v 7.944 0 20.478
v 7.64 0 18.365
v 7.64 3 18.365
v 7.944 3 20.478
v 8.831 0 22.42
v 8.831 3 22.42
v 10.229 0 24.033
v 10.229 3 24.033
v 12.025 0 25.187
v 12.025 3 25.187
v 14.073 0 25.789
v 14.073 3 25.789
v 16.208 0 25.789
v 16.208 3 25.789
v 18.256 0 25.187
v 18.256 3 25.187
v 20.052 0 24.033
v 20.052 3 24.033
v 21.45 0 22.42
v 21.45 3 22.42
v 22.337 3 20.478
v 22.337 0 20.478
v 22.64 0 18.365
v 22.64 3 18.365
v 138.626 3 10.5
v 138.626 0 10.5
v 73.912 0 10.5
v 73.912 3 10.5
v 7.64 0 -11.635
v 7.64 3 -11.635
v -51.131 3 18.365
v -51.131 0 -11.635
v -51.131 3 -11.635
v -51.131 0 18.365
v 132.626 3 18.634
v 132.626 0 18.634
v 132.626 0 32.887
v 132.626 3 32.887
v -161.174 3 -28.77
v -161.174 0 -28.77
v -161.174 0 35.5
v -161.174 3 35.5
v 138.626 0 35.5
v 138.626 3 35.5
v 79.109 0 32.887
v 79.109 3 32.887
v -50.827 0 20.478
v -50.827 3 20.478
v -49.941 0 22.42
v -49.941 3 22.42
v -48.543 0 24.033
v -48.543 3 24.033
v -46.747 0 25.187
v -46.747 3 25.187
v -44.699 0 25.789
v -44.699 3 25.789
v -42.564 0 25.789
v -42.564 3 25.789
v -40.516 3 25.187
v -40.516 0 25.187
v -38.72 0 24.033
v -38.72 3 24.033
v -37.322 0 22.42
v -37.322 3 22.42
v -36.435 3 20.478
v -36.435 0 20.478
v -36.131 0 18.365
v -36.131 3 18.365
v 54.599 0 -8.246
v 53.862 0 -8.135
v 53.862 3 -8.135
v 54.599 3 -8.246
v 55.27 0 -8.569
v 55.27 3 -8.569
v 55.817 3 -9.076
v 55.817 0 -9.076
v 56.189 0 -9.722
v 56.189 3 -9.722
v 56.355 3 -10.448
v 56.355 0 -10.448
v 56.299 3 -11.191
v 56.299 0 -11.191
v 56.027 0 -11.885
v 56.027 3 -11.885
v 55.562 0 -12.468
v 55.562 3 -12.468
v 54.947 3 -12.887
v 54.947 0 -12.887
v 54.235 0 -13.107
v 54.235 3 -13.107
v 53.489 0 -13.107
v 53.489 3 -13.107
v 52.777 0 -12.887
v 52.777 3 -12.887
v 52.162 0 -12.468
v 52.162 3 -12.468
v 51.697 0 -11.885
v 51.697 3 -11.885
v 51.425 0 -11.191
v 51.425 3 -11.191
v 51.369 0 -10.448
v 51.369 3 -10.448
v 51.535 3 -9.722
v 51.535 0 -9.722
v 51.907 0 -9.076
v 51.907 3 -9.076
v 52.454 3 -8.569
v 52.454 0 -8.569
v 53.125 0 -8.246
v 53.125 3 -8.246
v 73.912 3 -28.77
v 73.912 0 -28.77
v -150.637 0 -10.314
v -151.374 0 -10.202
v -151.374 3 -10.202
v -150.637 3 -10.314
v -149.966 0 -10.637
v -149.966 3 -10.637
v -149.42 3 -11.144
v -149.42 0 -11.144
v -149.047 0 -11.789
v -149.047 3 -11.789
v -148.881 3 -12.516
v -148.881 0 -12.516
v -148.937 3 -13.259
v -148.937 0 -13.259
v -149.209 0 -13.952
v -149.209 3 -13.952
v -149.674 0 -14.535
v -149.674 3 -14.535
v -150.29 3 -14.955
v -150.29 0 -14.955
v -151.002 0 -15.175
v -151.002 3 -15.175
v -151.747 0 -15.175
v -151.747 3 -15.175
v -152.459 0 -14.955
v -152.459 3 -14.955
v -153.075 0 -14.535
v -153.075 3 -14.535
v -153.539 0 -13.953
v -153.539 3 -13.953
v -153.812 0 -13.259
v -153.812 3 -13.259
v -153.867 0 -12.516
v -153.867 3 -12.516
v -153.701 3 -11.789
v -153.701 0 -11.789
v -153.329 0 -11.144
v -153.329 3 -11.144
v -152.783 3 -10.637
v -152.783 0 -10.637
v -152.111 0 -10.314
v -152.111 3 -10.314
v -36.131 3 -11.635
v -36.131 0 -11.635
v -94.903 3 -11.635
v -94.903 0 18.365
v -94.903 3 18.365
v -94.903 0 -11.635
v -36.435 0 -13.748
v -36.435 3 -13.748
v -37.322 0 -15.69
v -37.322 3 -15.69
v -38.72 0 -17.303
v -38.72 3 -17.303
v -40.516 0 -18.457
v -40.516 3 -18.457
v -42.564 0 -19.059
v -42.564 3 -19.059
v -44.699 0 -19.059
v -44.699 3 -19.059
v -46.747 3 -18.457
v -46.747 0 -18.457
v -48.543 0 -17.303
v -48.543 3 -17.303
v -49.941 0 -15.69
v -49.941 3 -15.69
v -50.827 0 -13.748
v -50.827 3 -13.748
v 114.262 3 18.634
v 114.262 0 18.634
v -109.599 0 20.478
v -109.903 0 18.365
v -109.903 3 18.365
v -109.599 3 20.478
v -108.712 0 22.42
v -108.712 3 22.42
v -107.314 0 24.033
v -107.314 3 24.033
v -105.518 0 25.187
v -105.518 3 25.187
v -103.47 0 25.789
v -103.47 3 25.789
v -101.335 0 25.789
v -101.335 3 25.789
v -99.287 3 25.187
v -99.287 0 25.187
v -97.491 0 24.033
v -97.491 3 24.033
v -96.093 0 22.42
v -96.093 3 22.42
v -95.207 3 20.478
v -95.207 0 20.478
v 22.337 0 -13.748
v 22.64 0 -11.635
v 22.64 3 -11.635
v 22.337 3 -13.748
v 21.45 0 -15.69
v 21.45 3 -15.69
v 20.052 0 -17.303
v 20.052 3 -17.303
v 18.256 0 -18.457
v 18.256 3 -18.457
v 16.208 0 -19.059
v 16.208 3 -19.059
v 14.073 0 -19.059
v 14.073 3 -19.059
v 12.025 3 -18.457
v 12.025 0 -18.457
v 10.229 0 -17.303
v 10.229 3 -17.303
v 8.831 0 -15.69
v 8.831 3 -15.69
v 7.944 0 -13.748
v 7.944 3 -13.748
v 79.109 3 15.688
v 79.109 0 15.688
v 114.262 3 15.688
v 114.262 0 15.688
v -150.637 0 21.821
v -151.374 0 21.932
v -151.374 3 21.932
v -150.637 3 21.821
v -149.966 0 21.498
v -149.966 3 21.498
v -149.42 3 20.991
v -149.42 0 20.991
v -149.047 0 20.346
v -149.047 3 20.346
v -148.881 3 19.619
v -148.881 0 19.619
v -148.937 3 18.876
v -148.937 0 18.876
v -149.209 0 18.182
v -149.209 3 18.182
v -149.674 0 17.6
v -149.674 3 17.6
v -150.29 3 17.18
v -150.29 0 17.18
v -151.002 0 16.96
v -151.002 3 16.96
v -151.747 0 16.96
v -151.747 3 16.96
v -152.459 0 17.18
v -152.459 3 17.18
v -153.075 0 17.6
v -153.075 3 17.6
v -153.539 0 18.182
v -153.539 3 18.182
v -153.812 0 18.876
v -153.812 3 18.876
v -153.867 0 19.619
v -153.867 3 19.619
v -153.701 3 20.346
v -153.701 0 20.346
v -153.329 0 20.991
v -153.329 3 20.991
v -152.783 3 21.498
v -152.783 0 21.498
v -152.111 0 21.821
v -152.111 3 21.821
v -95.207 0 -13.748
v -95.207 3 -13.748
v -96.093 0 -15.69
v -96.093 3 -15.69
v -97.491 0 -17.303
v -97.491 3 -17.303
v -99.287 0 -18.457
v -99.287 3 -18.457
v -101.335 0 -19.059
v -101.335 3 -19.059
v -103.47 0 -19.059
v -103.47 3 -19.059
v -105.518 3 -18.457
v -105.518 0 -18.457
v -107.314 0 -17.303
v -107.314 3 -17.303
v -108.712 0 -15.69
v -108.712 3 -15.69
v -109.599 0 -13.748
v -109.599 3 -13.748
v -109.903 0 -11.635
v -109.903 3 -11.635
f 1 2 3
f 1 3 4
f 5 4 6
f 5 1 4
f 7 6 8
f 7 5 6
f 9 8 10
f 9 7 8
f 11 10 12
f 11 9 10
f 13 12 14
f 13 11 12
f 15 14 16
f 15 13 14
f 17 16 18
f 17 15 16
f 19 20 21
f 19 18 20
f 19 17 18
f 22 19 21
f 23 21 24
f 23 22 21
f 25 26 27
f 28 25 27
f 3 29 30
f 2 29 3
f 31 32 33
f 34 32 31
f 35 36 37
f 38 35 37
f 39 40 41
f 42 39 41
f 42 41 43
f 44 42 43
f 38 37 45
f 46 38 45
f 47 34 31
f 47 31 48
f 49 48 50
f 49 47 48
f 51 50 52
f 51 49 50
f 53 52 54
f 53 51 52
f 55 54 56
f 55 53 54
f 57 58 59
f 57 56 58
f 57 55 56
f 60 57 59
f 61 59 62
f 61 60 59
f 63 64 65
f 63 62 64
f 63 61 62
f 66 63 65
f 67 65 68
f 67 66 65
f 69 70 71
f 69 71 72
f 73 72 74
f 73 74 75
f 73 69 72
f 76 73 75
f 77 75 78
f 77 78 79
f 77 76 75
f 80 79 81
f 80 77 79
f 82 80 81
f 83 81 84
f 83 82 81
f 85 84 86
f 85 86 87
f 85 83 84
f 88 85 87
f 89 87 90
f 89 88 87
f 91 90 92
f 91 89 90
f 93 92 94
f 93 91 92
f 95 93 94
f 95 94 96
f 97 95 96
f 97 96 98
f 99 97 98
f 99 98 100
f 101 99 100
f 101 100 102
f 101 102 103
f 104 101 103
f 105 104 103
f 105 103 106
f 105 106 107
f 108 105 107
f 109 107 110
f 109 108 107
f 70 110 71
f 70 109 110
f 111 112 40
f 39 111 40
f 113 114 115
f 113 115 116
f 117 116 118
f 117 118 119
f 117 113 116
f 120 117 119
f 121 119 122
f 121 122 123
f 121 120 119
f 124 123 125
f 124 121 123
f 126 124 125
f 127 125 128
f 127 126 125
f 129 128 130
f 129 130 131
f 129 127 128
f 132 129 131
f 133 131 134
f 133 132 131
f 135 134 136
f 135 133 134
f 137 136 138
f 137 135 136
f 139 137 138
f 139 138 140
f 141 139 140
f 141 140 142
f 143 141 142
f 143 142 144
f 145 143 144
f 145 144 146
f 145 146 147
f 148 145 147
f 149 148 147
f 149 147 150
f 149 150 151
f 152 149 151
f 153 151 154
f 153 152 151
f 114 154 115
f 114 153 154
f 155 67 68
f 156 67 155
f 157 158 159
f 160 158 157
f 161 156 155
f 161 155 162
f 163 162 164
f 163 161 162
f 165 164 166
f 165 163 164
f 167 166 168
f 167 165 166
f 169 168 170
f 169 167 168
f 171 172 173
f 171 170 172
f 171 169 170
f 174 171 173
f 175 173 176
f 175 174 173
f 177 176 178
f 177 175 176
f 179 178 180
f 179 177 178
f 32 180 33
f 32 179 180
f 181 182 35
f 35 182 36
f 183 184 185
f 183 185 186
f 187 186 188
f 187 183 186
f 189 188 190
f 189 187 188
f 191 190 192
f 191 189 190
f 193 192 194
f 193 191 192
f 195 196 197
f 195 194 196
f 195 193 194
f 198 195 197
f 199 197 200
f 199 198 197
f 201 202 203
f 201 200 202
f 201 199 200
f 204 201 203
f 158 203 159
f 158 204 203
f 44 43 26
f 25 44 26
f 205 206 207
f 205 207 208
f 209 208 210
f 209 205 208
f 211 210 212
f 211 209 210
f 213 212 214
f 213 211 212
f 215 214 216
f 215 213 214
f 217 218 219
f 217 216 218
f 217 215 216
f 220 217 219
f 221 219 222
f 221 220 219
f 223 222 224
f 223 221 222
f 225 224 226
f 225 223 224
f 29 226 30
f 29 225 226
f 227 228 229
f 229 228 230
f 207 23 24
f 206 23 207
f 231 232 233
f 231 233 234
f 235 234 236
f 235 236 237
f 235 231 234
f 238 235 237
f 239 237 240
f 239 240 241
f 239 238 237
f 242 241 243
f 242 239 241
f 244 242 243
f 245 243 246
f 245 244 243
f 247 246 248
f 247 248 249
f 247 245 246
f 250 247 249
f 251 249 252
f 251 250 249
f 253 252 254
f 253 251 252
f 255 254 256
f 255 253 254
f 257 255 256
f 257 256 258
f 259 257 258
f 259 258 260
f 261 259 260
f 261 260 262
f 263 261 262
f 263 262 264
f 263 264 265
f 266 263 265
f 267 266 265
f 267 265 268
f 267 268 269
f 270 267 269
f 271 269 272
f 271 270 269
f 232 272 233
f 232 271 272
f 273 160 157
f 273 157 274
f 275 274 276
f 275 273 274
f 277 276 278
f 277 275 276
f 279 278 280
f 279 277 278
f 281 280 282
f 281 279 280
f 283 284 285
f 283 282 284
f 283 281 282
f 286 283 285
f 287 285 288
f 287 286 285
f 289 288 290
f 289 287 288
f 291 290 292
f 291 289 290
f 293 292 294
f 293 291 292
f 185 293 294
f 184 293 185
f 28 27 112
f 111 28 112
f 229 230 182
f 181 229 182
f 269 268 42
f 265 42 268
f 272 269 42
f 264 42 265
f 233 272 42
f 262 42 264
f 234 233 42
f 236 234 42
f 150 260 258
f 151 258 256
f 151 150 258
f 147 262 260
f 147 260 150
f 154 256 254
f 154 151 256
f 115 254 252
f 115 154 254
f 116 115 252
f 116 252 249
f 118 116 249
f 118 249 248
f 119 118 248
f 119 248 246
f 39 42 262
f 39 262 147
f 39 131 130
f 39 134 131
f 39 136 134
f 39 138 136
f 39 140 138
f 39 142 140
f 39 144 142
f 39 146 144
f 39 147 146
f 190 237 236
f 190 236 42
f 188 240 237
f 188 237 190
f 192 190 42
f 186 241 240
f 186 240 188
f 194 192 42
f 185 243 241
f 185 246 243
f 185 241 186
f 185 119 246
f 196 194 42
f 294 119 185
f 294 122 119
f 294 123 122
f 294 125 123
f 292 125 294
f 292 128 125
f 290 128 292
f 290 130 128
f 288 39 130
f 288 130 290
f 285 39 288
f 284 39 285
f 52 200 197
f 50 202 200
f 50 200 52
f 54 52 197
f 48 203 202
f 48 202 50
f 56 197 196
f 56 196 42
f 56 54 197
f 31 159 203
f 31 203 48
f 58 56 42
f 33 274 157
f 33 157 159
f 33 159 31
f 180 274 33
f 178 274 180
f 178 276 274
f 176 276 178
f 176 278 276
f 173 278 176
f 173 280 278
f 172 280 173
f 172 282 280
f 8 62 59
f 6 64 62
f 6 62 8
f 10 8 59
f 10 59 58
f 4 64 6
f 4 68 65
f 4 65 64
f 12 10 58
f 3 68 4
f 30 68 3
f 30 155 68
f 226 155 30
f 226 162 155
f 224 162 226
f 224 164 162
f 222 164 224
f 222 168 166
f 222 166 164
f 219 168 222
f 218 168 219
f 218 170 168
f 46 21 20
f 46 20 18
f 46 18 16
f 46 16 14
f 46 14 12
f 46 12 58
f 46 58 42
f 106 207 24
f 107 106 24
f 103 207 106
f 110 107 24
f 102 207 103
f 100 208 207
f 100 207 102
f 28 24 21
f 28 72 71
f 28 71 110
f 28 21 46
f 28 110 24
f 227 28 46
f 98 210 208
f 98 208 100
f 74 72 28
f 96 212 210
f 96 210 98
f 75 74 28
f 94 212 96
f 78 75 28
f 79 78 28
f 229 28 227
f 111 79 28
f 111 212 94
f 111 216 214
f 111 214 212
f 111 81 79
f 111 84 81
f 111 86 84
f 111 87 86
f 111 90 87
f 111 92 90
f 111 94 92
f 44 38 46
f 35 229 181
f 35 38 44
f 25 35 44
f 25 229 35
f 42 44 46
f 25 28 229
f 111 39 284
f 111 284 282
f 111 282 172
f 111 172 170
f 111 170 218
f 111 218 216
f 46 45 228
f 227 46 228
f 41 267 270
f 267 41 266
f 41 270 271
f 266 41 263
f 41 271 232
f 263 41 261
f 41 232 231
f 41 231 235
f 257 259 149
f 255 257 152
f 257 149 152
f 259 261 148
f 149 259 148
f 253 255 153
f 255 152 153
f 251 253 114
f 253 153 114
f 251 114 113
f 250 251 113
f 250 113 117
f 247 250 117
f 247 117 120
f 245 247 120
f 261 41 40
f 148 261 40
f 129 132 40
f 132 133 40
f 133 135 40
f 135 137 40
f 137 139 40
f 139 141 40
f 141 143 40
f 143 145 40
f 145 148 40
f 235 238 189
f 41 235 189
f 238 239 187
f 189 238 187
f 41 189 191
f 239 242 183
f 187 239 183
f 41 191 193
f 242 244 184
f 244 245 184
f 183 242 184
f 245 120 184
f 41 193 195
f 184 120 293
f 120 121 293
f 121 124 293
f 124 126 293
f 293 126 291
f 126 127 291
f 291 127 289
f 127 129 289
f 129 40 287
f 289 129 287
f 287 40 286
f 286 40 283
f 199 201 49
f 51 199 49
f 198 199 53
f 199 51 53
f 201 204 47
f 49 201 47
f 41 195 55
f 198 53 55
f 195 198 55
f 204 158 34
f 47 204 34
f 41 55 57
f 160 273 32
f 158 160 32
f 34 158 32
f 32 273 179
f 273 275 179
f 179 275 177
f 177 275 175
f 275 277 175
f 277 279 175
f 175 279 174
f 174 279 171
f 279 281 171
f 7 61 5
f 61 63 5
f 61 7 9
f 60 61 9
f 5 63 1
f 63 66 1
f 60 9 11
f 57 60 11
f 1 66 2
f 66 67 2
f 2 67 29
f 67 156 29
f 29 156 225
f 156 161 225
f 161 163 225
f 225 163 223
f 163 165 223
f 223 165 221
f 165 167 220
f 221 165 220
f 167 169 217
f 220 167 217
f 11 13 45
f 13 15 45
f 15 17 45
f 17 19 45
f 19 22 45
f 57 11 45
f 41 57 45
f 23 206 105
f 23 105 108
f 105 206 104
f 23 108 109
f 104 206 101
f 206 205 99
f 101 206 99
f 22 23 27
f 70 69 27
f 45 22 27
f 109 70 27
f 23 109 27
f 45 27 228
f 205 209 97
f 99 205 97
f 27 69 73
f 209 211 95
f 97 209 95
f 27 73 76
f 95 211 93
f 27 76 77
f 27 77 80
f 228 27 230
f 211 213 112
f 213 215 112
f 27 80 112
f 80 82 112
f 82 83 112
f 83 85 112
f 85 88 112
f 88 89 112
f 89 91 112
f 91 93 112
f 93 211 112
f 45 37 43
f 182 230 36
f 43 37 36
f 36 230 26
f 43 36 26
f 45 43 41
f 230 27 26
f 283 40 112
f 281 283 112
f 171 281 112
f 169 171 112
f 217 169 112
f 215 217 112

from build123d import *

# Parameters (mm, degrees)
ESQUISSE1_R             = 2.5
BOSS_EXTRU_1_DEPTH      = 3
ENL_V_MAT_EXTRU_1_DEPTH = 166.064843505


with BuildPart() as part:
    # Esquisse1 → Boss.-Extru.1 (new body)
    with BuildSketch(Plane(origin=(0, 0, 0), x_dir=(1, 0, 0), z_dir=(0, 1, 0))):
        Polygon((-161.174292495, 18.77), (-161.174292495, -25.5), (-161.174292495, -35.5), (138.625707505, -35.5), (138.625707505, -10.5), (73.911950915, -10.5), (73.911950915, 28.77), (-161.174292495, 28.77), align=None)
        with Locations(Location((-151.374292495, -19.4325, 0), (0, 0, 270))):
            Circle(ESQUISSE1_R, mode=Mode.SUBTRACT)
        with Locations(Location((-151.374292495, 12.7025, 0), (0, 0, 270))):
            Circle(ESQUISSE1_R, mode=Mode.SUBTRACT)
        with Locations(Location((53.861950915, 10.635, 0), (0, 0, 270))):
            Circle(ESQUISSE1_R, mode=Mode.SUBTRACT)
        Polygon((114.261515644, -15.687745544), (114.261515644, -18.634239014), (132.625707505, -18.634239014), (132.625707505, -32.887044638), (114.261515644, -32.887044638), (79.109163313, -32.887044638), (79.109163313, -15.687745544), align=None, mode=Mode.SUBTRACT)
    extrude(amount=BOSS_EXTRU_1_DEPTH)

    # Esquisse2 → Enlèv. mat.-Extru.1 (cut, through all)
    with BuildSketch(Plane.XZ):
        with BuildLine():
            Line((7.640390062, -11.635), (7.640390062, 18.365))
            ThreePointArc((7.640390062, 18.365), (15.140390062, 25.865), (22.640390062, 18.365))
            Line((22.640390062, 18.365), (22.640390062, -11.635))
            ThreePointArc((22.640390062, -11.635), (15.140390062, -19.135), (7.640390062, -11.635))
        make_face()
        with BuildLine():
            Line((-51.13117079, -11.635), (-51.13117079, 18.365))
            ThreePointArc((-51.13117079, 18.365), (-43.63117079, 25.865), (-36.13117079, 18.365))
            Line((-36.13117079, 18.365), (-36.13117079, -11.635))
            ThreePointArc((-36.13117079, -11.635), (-43.63117079, -19.135), (-51.13117079, -11.635))
        make_face()
        with BuildLine():
            Line((-109.902731643, -11.635), (-109.902731643, 18.365))
            ThreePointArc((-109.902731643, 18.365), (-102.402731643, 25.865), (-94.902731643, 18.365))
            Line((-94.902731643, 18.365), (-94.902731643, -11.635))
            ThreePointArc((-94.902731643, -11.635), (-102.402731643, -19.135), (-109.902731643, -11.635))
        make_face()
    extrude(amount=-ENL_V_MAT_EXTRU_1_DEPTH, mode=Mode.SUBTRACT)


solid = part.part
